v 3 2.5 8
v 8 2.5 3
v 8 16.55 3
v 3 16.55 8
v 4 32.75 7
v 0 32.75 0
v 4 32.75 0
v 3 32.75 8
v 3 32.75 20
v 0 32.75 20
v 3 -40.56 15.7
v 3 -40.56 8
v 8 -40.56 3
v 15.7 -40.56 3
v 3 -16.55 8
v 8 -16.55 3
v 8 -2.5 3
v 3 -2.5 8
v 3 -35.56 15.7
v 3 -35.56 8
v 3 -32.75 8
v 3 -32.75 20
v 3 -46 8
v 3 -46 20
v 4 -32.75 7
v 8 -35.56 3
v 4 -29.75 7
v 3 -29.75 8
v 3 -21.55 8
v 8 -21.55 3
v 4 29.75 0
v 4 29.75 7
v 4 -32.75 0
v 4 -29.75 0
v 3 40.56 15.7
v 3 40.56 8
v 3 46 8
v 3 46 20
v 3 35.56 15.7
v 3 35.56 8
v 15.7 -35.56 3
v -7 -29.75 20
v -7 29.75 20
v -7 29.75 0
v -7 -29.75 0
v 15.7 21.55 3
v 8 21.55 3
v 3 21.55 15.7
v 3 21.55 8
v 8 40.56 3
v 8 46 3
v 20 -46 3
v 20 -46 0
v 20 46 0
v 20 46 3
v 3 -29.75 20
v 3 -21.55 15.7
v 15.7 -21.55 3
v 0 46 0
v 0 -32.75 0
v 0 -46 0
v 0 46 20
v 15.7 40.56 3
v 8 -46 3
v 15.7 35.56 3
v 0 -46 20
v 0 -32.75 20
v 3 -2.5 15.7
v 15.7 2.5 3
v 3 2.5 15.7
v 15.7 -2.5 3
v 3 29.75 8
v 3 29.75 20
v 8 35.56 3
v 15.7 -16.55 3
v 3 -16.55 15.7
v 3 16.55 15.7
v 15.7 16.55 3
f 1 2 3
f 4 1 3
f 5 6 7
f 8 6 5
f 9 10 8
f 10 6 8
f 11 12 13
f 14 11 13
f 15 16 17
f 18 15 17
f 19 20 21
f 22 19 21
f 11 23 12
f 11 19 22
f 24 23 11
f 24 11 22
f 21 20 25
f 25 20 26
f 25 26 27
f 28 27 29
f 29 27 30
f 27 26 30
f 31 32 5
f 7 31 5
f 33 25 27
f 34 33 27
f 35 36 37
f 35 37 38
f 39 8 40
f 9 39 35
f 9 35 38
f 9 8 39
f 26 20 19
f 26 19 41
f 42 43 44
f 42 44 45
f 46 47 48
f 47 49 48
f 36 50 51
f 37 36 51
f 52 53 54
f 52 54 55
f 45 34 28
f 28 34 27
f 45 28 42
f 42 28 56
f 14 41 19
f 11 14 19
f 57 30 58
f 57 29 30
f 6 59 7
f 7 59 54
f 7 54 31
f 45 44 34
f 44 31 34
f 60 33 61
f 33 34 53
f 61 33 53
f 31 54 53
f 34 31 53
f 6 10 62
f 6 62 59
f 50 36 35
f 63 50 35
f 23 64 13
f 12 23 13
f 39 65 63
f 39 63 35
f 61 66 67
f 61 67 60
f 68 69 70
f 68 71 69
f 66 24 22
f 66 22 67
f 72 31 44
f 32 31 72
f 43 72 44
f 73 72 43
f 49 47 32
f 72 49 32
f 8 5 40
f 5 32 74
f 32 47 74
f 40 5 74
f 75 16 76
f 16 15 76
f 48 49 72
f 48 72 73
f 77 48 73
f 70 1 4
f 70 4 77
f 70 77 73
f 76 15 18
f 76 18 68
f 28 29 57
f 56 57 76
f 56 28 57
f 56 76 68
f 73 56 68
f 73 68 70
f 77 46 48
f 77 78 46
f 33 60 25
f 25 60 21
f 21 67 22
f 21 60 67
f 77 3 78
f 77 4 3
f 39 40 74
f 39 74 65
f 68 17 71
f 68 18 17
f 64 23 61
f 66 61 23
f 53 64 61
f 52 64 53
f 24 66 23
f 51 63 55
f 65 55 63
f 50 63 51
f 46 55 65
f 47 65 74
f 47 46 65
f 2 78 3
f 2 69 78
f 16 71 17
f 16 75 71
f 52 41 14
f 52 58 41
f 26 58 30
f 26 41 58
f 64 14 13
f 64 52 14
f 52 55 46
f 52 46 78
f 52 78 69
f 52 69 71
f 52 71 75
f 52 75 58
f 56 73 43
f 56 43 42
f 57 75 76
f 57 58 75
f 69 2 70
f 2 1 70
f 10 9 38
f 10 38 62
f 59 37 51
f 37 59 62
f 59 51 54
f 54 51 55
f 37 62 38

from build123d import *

# Parameters (mm, degrees)
F1_DEPTH  = 46
F2_SIZE   = 5
F6_DEPTH  = 2.5
F8_DEPTH  = 2.5
F10_DEPTH = 2.5
F11_W     = 4
F11_H     = 3
F12_DEPTH = 20.001
F15_DEPTH = 5
F18_DEPTH = 5
F19_W     = 59.5
F19_H     = 20
F20_DEPTH = 7


with BuildPart() as f1:
    # F0 (on Front) → F1 (new body, symmetric)
    with BuildSketch(Plane.XZ):
        Polygon((0, 20), (0, 0), (20, 0), (20, 3), (3, 3), (3, 20), align=None)
    extrude(amount=F1_DEPTH, both=True)

    # F2
    f2_edges = [f1.edges().sort_by_distance(p)[0] for p in [
        (3, 0, 3),
    ]]
    chamfer(f2_edges, length=F2_SIZE)

    # F5 (on Front) → F6 (join, symmetric)
    with BuildSketch(Plane.XZ):
        Polygon((15.7, 3), (3, 15.7), (3, 3), align=None)
    extrude(amount=F6_DEPTH, both=True)

    # F7 (on offset) → F8 (join, symmetric)
    with BuildSketch(Plane.XZ.offset(19.05)):
        Polygon((15.7, 3), (3, 15.7), (3, 3), align=None)
    extrude(amount=F8_DEPTH, both=True)

    # F9 (on offset) → F10 (join, symmetric)
    with BuildSketch(Plane.XZ.offset(-19.05)):
        Polygon((15.7, 3), (3, 15.7), (3, 3), align=None)
    extrude(amount=F10_DEPTH, both=True)

    # F11 (on face) → F12 (cut, through all)
    with BuildSketch(Plane.XY.offset(20)):
        with Locations((2, 31.25)):
            Rectangle(F11_W, F11_H)
        with Locations((2, -31.25)):
            Rectangle(F11_W, F11_H)
    extrude(amount=-F12_DEPTH, mode=Mode.SUBTRACT)

    # F14 (on offset) → F15 (join)
    with BuildSketch(Plane.XZ.offset(35.56)):
        Polygon((8, 3), (15.7, 3), (3, 15.7), (3, 8), align=None)
    extrude(amount=F15_DEPTH)

    # F17 (on offset) → F18 (join)
    with BuildSketch(Plane.XZ.offset(-35.56)):
        Polygon((15.7, 3), (3, 15.7), (3, 8), (8, 3), align=None)
    extrude(amount=-F18_DEPTH)

    # F19 (on face) → F20 (join)
    with BuildSketch(Plane(origin=(0, 0, 0), x_dir=(0, -1, 0), z_dir=(-1, 0, 0))):
        with Locations((0, 10)):
            Rectangle(F19_W, F19_H)
    extrude(amount=F20_DEPTH)


solid = f1.part
